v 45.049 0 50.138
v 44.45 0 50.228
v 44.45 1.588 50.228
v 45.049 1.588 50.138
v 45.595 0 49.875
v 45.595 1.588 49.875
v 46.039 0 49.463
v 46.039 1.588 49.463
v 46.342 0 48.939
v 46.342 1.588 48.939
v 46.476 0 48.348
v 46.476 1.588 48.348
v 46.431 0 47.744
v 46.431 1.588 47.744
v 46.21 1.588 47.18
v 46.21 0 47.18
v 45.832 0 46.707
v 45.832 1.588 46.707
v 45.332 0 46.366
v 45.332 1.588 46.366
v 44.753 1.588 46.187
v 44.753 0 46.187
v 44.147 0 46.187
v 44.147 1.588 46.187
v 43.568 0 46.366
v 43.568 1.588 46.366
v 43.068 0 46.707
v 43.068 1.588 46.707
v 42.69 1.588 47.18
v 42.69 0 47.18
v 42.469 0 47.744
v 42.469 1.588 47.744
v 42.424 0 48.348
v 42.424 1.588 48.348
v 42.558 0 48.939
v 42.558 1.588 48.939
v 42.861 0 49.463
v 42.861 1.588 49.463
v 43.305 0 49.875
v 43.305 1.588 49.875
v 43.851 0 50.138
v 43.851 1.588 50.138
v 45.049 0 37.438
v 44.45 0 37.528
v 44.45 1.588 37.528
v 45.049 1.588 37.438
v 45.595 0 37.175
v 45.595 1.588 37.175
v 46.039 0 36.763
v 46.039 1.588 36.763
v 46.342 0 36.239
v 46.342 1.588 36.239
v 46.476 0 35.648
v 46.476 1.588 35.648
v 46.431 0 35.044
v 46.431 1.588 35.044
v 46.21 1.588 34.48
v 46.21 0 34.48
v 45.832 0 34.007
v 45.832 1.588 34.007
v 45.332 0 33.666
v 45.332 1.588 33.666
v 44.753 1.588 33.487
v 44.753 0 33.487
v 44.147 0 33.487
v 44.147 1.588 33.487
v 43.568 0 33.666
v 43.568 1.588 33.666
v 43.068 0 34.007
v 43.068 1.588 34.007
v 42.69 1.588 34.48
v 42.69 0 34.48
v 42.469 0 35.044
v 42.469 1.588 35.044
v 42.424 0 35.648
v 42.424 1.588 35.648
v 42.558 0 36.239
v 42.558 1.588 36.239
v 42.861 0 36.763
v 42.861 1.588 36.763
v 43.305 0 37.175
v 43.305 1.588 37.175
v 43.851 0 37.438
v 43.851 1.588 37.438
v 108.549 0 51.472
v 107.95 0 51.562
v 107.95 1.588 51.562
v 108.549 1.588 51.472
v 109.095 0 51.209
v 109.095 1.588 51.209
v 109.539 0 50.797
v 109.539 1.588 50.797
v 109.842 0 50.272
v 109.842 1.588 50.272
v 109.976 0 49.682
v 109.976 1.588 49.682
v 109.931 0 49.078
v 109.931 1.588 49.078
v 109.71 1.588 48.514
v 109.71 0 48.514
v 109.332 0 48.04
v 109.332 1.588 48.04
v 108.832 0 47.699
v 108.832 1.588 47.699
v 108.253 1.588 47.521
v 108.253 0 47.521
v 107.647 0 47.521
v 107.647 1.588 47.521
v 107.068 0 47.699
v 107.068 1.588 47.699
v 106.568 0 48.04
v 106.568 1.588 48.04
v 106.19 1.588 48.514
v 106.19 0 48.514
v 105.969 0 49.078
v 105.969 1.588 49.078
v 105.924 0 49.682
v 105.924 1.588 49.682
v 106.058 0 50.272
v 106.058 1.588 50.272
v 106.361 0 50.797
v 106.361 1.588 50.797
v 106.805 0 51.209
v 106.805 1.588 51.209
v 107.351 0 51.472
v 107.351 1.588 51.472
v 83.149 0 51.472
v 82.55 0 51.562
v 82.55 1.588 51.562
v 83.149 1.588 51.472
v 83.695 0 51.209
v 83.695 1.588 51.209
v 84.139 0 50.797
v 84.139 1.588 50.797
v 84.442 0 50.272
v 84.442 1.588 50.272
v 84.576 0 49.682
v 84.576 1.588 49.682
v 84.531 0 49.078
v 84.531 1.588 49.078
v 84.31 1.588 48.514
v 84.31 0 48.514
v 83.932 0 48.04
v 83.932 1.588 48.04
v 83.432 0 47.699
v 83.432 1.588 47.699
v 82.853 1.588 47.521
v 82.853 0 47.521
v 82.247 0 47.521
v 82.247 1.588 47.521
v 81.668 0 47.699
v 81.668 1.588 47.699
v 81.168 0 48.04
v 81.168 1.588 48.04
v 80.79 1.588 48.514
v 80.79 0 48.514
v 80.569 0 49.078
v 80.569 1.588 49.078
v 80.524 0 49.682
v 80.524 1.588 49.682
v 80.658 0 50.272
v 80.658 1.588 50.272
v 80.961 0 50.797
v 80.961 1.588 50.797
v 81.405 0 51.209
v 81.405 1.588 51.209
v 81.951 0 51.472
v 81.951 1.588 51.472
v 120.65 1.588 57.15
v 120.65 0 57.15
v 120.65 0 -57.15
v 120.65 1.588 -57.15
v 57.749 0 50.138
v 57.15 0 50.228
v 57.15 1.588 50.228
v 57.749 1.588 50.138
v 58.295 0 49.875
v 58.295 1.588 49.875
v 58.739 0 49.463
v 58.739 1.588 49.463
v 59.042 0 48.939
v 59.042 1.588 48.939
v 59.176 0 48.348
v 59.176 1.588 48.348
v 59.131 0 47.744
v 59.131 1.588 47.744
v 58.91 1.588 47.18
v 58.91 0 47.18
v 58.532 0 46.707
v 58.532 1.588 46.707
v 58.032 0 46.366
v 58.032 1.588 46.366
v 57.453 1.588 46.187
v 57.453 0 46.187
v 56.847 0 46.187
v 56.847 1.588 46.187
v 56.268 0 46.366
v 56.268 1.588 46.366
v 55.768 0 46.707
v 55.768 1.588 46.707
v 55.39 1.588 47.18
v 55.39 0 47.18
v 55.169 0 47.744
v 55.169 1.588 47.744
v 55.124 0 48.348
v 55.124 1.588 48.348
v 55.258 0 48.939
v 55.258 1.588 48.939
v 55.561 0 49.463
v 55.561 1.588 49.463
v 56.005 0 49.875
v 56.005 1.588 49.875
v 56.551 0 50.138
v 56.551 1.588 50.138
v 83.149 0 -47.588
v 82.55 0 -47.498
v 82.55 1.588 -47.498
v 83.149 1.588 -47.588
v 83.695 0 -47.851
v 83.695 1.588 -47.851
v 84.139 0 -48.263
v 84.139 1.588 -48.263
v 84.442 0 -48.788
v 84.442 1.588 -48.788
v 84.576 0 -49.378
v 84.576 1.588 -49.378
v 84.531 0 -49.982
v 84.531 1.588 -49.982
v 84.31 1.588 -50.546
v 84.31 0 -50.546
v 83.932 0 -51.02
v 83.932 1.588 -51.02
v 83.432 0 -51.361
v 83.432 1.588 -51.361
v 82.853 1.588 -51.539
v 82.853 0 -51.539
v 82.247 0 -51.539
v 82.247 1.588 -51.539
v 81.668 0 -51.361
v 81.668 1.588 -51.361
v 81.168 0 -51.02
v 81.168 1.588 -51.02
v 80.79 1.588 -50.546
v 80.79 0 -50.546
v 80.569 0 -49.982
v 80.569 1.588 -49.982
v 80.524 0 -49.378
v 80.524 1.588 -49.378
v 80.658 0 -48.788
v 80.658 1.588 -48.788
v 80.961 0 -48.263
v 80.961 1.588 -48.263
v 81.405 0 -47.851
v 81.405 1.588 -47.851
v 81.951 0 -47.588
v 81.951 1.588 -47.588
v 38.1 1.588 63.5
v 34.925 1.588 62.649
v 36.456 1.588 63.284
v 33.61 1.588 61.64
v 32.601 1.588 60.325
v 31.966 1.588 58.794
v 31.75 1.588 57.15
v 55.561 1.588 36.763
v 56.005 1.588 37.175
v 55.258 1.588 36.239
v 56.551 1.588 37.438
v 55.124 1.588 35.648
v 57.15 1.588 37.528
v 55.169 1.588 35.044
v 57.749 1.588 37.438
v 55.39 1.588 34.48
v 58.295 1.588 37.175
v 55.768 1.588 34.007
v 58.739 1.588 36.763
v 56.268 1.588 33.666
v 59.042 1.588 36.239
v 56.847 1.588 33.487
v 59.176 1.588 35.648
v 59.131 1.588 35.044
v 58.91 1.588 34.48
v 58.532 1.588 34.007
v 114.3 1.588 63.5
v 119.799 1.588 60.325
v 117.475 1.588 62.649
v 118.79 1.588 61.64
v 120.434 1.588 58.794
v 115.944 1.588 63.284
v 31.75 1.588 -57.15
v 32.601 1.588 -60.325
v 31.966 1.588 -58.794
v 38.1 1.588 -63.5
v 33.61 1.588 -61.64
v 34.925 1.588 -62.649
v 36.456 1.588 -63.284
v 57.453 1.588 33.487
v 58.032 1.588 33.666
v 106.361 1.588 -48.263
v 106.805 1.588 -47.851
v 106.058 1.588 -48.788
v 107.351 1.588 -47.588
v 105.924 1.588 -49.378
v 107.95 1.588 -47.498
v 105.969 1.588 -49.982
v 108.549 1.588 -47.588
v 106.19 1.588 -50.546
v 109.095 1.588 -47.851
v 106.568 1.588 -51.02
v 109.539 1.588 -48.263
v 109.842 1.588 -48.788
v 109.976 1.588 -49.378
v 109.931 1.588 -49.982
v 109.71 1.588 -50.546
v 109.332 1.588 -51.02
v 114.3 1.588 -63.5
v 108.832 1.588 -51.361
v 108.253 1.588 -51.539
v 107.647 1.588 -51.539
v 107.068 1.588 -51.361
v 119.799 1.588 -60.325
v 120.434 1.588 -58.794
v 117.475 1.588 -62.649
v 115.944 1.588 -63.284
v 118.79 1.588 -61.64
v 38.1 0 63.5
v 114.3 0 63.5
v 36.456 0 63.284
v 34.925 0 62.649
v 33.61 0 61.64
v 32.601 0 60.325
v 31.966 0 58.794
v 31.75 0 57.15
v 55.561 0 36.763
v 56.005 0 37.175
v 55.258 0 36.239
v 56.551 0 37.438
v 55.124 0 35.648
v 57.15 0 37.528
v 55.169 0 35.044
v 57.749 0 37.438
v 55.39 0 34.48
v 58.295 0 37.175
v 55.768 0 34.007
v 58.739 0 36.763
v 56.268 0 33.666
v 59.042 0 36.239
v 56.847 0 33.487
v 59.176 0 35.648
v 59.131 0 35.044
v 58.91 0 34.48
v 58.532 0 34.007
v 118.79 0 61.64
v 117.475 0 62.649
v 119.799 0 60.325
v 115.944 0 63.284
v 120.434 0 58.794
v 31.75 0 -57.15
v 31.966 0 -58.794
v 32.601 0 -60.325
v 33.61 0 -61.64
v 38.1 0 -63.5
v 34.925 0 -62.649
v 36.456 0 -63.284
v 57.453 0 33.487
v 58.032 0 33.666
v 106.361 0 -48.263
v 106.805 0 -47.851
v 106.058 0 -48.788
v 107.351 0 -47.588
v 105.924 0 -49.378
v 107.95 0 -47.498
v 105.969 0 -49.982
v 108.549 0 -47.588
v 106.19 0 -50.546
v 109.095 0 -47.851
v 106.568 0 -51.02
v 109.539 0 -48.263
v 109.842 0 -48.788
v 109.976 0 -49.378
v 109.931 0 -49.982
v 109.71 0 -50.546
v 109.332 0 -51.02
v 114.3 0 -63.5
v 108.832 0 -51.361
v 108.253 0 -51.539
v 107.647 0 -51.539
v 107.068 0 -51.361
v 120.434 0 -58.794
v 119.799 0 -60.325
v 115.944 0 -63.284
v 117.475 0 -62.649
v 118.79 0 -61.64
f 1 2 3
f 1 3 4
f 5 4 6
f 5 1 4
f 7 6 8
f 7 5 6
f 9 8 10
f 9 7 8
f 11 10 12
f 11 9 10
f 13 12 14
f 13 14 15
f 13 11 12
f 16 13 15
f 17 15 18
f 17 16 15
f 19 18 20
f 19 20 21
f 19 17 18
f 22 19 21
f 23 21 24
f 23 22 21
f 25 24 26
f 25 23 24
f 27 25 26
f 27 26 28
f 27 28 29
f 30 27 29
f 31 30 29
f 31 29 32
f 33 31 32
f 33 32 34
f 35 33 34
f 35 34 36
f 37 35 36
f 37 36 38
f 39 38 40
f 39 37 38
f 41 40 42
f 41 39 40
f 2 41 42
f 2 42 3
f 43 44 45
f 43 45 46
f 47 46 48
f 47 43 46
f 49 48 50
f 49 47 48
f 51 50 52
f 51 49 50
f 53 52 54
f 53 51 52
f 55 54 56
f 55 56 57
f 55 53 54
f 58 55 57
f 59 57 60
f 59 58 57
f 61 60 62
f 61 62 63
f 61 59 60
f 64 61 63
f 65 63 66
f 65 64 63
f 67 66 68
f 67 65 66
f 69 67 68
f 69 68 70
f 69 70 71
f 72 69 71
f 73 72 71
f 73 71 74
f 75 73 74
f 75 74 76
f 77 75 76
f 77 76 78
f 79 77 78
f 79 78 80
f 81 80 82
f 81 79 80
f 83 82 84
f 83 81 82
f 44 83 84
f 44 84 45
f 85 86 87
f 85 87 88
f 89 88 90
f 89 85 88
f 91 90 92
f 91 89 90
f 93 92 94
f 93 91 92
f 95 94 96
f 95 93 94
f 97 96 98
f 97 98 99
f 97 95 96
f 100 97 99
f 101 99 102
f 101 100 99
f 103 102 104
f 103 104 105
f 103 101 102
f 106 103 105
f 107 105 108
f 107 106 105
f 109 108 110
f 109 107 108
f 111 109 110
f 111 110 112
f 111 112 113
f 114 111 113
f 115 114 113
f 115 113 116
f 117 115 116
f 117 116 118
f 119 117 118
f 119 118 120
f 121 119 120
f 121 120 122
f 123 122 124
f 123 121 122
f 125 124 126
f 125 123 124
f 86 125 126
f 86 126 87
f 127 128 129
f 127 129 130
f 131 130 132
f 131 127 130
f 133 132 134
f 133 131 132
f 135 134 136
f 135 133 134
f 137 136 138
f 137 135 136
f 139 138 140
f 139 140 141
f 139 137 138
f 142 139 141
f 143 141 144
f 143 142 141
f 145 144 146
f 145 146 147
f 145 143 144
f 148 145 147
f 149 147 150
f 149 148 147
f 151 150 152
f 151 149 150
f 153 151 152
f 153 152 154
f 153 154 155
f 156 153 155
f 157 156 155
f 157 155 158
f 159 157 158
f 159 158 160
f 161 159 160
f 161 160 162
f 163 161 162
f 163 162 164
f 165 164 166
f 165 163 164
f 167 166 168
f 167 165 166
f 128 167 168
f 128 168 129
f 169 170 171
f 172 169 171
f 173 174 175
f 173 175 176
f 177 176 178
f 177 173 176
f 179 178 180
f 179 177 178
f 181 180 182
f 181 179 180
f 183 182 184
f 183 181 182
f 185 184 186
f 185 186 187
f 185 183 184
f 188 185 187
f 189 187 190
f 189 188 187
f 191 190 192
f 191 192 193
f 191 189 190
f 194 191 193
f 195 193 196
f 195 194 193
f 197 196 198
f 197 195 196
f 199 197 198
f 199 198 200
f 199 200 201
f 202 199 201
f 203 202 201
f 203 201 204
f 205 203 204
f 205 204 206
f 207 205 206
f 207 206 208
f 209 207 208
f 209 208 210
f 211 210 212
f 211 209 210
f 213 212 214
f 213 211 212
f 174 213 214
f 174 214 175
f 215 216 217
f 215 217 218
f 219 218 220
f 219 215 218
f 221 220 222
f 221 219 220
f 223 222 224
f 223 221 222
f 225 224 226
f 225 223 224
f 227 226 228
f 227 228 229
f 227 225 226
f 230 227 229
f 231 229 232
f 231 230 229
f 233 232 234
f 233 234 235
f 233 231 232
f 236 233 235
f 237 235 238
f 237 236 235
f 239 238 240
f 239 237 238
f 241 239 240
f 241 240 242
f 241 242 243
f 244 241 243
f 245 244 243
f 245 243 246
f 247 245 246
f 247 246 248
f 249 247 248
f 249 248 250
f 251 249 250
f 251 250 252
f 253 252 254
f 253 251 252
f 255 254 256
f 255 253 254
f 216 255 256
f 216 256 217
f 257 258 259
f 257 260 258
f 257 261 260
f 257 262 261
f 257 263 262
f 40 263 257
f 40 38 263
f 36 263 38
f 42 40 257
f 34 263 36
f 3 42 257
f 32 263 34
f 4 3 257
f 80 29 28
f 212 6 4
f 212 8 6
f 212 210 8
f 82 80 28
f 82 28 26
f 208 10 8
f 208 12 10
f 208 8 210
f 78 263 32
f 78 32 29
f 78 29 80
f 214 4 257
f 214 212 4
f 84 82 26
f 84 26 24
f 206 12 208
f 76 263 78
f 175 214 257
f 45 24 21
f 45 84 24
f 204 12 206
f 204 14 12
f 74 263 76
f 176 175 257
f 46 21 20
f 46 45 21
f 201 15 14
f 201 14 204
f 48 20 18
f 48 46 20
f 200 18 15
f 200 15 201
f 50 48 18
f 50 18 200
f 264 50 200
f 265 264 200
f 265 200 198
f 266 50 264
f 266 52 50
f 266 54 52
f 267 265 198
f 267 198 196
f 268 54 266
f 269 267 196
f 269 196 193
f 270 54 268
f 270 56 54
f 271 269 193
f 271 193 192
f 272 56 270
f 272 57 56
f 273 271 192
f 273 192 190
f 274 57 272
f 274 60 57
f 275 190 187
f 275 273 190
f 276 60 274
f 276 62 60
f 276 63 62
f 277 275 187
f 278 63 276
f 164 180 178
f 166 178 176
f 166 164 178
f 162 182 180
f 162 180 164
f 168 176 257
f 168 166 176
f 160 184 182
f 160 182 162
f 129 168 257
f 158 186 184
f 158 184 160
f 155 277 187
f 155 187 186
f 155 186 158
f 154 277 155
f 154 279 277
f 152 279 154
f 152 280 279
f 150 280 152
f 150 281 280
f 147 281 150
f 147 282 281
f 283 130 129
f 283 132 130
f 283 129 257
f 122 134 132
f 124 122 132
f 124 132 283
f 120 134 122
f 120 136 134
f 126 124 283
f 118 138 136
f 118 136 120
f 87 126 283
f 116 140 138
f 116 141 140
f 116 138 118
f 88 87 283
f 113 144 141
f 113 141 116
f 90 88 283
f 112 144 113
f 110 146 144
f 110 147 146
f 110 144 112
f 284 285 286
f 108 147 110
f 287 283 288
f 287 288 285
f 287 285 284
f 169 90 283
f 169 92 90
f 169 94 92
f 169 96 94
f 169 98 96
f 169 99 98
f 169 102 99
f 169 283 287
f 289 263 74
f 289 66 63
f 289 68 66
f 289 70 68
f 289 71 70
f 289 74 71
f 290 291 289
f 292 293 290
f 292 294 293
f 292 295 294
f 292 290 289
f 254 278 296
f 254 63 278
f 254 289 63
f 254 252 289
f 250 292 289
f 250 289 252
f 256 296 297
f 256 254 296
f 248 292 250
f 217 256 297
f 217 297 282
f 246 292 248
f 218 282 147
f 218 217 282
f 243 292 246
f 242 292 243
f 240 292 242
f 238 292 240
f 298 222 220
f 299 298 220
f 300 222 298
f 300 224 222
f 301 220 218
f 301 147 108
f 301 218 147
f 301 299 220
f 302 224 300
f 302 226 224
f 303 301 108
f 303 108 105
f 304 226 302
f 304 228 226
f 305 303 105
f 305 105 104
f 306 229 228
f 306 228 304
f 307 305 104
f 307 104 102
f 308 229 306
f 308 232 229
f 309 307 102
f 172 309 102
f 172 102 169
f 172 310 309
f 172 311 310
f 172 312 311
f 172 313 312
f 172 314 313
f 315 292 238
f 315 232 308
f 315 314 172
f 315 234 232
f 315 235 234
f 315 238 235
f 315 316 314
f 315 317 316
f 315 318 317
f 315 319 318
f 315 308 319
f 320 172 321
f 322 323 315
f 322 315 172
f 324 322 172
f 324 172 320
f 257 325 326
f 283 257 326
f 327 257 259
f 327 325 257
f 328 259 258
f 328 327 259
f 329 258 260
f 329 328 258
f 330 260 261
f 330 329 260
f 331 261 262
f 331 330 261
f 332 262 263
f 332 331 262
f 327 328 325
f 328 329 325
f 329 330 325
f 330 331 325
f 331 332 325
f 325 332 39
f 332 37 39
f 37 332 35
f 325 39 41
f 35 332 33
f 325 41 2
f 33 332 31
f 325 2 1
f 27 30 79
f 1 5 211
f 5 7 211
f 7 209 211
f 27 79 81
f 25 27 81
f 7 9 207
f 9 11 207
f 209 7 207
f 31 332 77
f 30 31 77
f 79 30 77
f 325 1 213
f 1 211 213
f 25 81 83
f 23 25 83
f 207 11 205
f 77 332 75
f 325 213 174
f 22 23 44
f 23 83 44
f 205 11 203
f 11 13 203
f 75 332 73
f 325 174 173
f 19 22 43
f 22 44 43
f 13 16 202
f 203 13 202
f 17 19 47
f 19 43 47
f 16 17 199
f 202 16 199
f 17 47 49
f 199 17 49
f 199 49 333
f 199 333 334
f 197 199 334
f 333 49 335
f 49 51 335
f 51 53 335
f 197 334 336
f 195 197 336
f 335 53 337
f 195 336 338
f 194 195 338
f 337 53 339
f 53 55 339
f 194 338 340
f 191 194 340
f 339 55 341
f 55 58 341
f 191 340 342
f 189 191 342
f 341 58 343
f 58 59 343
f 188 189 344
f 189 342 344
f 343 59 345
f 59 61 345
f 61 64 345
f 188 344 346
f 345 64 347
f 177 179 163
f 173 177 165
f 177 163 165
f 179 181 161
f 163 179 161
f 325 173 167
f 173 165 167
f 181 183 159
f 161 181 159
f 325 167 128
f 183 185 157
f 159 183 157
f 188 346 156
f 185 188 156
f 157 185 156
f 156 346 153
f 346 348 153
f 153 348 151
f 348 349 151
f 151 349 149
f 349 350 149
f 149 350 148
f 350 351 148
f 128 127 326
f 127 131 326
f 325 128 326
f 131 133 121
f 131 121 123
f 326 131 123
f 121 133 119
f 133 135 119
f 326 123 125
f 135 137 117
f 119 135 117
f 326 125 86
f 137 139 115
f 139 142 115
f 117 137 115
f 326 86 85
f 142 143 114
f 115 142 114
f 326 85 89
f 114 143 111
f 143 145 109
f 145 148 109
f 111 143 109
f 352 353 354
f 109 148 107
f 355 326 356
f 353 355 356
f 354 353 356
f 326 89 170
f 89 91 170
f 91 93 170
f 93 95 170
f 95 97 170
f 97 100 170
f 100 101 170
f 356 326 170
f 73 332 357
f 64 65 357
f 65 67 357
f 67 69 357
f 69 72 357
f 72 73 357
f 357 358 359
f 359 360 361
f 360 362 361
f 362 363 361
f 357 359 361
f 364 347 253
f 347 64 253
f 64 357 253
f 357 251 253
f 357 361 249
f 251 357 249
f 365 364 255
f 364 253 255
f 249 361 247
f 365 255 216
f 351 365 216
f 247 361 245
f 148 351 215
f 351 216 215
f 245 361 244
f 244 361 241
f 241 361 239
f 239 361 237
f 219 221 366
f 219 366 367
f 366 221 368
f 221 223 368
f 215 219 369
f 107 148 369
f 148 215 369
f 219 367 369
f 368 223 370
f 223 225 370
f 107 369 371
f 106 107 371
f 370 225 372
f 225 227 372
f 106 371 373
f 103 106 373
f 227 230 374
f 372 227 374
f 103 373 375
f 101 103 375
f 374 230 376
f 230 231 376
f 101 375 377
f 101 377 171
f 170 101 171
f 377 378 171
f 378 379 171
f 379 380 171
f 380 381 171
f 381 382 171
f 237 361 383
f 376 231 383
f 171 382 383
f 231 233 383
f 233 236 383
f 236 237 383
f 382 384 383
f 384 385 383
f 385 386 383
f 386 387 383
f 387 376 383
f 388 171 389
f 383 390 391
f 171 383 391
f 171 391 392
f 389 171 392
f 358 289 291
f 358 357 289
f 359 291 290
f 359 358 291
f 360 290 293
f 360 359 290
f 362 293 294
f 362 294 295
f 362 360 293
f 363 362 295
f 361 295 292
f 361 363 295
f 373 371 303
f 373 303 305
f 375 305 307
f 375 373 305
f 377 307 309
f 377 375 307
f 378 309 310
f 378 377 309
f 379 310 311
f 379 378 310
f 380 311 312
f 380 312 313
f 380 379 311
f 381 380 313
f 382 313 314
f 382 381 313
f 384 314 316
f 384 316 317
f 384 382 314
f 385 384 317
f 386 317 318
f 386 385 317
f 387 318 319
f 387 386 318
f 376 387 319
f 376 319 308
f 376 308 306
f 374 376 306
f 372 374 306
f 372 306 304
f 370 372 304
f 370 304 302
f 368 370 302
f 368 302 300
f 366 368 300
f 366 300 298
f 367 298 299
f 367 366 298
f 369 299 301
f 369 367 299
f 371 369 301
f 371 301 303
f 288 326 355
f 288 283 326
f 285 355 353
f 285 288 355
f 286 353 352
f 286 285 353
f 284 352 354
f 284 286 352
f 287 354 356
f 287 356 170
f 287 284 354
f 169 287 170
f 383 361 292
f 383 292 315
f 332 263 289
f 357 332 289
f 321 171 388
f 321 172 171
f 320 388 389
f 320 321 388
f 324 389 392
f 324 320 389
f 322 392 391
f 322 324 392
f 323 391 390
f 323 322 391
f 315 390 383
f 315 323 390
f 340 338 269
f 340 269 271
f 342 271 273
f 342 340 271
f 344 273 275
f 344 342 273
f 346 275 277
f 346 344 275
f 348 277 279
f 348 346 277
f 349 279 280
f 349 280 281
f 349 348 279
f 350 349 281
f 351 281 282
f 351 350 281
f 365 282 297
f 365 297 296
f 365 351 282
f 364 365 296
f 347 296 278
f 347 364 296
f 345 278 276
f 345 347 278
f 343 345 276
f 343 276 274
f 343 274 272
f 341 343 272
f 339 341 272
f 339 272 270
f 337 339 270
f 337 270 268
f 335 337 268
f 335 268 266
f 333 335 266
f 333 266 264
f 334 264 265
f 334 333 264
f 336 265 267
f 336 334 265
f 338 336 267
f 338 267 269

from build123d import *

# Parameters (mm, degrees)
SKETCH1_W           = 241.3
SKETCH1_H           = 127
SKETCH1_R           = 2.032
BOSS_EXTRUDE1_DEPTH = 1.5875
SKETCH2_W           = 152.4
SKETCH2_H           = 127
CUT_EXTRUDE1_DEPTH  = 137.349523858
FILLET2_R           = 6.35


with BuildPart() as part:
    # Sketch1 → Boss-Extrude1 (new body)
    with BuildSketch(Plane(origin=(0, 0, 0), x_dir=(1, 0, 0), z_dir=(0, 1, 0))):
        Rectangle(SKETCH1_W, SKETCH1_H)
        with Locations(Location((82.55, 49.53, 0), (0, 0, 270))):
            Circle(SKETCH1_R, mode=Mode.SUBTRACT)
        with Locations(Location((82.55, -49.53, 0), (0, 0, 270))):
            Circle(SKETCH1_R, mode=Mode.SUBTRACT)
        with Locations(Location((107.95, -49.53, 0), (0, 0, 270))):
            Circle(SKETCH1_R, mode=Mode.SUBTRACT)
        with Locations(Location((107.95, 49.53, 0), (0, 0, 270))):
            Circle(SKETCH1_R, mode=Mode.SUBTRACT)
        with Locations(Location((57.15, -35.4965, 0), (0, 0, 270))):
            Circle(SKETCH1_R, mode=Mode.SUBTRACT)
        with Locations(Location((44.45, -35.4965, 0), (0, 0, 270))):
            Circle(SKETCH1_R, mode=Mode.SUBTRACT)
        with Locations(Location((44.45, -48.1965, 0), (0, 0, 270))):
            Circle(SKETCH1_R, mode=Mode.SUBTRACT)
        with Locations(Location((57.15, -48.1965, 0), (0, 0, 270))):
            Circle(SKETCH1_R, mode=Mode.SUBTRACT)
    extrude(amount=BOSS_EXTRUDE1_DEPTH)

    # Sketch2 → Cut-Extrude1 (cut, through all)
    with BuildSketch(Plane(origin=(0, 1.5875, 0), x_dir=(1, 0, 0), z_dir=(0, 1, 0))):
        with Locations((-44.45, 0)):
            Rectangle(SKETCH2_W, SKETCH2_H)
    extrude(amount=-CUT_EXTRUDE1_DEPTH, mode=Mode.SUBTRACT)

    # Fillet2
    fillet2_edges = [part.edges().sort_by_distance(p)[0] for p in [
        (120.65, 0.79375, 63.5),
        (120.65, 0.79375, -63.5),
        (31.75, 0.79375, -63.5),
        (31.75, 0.79375, 63.5),
    ]]
    fillet(fillet2_edges, radius=FILLET2_R)


solid = part.part
